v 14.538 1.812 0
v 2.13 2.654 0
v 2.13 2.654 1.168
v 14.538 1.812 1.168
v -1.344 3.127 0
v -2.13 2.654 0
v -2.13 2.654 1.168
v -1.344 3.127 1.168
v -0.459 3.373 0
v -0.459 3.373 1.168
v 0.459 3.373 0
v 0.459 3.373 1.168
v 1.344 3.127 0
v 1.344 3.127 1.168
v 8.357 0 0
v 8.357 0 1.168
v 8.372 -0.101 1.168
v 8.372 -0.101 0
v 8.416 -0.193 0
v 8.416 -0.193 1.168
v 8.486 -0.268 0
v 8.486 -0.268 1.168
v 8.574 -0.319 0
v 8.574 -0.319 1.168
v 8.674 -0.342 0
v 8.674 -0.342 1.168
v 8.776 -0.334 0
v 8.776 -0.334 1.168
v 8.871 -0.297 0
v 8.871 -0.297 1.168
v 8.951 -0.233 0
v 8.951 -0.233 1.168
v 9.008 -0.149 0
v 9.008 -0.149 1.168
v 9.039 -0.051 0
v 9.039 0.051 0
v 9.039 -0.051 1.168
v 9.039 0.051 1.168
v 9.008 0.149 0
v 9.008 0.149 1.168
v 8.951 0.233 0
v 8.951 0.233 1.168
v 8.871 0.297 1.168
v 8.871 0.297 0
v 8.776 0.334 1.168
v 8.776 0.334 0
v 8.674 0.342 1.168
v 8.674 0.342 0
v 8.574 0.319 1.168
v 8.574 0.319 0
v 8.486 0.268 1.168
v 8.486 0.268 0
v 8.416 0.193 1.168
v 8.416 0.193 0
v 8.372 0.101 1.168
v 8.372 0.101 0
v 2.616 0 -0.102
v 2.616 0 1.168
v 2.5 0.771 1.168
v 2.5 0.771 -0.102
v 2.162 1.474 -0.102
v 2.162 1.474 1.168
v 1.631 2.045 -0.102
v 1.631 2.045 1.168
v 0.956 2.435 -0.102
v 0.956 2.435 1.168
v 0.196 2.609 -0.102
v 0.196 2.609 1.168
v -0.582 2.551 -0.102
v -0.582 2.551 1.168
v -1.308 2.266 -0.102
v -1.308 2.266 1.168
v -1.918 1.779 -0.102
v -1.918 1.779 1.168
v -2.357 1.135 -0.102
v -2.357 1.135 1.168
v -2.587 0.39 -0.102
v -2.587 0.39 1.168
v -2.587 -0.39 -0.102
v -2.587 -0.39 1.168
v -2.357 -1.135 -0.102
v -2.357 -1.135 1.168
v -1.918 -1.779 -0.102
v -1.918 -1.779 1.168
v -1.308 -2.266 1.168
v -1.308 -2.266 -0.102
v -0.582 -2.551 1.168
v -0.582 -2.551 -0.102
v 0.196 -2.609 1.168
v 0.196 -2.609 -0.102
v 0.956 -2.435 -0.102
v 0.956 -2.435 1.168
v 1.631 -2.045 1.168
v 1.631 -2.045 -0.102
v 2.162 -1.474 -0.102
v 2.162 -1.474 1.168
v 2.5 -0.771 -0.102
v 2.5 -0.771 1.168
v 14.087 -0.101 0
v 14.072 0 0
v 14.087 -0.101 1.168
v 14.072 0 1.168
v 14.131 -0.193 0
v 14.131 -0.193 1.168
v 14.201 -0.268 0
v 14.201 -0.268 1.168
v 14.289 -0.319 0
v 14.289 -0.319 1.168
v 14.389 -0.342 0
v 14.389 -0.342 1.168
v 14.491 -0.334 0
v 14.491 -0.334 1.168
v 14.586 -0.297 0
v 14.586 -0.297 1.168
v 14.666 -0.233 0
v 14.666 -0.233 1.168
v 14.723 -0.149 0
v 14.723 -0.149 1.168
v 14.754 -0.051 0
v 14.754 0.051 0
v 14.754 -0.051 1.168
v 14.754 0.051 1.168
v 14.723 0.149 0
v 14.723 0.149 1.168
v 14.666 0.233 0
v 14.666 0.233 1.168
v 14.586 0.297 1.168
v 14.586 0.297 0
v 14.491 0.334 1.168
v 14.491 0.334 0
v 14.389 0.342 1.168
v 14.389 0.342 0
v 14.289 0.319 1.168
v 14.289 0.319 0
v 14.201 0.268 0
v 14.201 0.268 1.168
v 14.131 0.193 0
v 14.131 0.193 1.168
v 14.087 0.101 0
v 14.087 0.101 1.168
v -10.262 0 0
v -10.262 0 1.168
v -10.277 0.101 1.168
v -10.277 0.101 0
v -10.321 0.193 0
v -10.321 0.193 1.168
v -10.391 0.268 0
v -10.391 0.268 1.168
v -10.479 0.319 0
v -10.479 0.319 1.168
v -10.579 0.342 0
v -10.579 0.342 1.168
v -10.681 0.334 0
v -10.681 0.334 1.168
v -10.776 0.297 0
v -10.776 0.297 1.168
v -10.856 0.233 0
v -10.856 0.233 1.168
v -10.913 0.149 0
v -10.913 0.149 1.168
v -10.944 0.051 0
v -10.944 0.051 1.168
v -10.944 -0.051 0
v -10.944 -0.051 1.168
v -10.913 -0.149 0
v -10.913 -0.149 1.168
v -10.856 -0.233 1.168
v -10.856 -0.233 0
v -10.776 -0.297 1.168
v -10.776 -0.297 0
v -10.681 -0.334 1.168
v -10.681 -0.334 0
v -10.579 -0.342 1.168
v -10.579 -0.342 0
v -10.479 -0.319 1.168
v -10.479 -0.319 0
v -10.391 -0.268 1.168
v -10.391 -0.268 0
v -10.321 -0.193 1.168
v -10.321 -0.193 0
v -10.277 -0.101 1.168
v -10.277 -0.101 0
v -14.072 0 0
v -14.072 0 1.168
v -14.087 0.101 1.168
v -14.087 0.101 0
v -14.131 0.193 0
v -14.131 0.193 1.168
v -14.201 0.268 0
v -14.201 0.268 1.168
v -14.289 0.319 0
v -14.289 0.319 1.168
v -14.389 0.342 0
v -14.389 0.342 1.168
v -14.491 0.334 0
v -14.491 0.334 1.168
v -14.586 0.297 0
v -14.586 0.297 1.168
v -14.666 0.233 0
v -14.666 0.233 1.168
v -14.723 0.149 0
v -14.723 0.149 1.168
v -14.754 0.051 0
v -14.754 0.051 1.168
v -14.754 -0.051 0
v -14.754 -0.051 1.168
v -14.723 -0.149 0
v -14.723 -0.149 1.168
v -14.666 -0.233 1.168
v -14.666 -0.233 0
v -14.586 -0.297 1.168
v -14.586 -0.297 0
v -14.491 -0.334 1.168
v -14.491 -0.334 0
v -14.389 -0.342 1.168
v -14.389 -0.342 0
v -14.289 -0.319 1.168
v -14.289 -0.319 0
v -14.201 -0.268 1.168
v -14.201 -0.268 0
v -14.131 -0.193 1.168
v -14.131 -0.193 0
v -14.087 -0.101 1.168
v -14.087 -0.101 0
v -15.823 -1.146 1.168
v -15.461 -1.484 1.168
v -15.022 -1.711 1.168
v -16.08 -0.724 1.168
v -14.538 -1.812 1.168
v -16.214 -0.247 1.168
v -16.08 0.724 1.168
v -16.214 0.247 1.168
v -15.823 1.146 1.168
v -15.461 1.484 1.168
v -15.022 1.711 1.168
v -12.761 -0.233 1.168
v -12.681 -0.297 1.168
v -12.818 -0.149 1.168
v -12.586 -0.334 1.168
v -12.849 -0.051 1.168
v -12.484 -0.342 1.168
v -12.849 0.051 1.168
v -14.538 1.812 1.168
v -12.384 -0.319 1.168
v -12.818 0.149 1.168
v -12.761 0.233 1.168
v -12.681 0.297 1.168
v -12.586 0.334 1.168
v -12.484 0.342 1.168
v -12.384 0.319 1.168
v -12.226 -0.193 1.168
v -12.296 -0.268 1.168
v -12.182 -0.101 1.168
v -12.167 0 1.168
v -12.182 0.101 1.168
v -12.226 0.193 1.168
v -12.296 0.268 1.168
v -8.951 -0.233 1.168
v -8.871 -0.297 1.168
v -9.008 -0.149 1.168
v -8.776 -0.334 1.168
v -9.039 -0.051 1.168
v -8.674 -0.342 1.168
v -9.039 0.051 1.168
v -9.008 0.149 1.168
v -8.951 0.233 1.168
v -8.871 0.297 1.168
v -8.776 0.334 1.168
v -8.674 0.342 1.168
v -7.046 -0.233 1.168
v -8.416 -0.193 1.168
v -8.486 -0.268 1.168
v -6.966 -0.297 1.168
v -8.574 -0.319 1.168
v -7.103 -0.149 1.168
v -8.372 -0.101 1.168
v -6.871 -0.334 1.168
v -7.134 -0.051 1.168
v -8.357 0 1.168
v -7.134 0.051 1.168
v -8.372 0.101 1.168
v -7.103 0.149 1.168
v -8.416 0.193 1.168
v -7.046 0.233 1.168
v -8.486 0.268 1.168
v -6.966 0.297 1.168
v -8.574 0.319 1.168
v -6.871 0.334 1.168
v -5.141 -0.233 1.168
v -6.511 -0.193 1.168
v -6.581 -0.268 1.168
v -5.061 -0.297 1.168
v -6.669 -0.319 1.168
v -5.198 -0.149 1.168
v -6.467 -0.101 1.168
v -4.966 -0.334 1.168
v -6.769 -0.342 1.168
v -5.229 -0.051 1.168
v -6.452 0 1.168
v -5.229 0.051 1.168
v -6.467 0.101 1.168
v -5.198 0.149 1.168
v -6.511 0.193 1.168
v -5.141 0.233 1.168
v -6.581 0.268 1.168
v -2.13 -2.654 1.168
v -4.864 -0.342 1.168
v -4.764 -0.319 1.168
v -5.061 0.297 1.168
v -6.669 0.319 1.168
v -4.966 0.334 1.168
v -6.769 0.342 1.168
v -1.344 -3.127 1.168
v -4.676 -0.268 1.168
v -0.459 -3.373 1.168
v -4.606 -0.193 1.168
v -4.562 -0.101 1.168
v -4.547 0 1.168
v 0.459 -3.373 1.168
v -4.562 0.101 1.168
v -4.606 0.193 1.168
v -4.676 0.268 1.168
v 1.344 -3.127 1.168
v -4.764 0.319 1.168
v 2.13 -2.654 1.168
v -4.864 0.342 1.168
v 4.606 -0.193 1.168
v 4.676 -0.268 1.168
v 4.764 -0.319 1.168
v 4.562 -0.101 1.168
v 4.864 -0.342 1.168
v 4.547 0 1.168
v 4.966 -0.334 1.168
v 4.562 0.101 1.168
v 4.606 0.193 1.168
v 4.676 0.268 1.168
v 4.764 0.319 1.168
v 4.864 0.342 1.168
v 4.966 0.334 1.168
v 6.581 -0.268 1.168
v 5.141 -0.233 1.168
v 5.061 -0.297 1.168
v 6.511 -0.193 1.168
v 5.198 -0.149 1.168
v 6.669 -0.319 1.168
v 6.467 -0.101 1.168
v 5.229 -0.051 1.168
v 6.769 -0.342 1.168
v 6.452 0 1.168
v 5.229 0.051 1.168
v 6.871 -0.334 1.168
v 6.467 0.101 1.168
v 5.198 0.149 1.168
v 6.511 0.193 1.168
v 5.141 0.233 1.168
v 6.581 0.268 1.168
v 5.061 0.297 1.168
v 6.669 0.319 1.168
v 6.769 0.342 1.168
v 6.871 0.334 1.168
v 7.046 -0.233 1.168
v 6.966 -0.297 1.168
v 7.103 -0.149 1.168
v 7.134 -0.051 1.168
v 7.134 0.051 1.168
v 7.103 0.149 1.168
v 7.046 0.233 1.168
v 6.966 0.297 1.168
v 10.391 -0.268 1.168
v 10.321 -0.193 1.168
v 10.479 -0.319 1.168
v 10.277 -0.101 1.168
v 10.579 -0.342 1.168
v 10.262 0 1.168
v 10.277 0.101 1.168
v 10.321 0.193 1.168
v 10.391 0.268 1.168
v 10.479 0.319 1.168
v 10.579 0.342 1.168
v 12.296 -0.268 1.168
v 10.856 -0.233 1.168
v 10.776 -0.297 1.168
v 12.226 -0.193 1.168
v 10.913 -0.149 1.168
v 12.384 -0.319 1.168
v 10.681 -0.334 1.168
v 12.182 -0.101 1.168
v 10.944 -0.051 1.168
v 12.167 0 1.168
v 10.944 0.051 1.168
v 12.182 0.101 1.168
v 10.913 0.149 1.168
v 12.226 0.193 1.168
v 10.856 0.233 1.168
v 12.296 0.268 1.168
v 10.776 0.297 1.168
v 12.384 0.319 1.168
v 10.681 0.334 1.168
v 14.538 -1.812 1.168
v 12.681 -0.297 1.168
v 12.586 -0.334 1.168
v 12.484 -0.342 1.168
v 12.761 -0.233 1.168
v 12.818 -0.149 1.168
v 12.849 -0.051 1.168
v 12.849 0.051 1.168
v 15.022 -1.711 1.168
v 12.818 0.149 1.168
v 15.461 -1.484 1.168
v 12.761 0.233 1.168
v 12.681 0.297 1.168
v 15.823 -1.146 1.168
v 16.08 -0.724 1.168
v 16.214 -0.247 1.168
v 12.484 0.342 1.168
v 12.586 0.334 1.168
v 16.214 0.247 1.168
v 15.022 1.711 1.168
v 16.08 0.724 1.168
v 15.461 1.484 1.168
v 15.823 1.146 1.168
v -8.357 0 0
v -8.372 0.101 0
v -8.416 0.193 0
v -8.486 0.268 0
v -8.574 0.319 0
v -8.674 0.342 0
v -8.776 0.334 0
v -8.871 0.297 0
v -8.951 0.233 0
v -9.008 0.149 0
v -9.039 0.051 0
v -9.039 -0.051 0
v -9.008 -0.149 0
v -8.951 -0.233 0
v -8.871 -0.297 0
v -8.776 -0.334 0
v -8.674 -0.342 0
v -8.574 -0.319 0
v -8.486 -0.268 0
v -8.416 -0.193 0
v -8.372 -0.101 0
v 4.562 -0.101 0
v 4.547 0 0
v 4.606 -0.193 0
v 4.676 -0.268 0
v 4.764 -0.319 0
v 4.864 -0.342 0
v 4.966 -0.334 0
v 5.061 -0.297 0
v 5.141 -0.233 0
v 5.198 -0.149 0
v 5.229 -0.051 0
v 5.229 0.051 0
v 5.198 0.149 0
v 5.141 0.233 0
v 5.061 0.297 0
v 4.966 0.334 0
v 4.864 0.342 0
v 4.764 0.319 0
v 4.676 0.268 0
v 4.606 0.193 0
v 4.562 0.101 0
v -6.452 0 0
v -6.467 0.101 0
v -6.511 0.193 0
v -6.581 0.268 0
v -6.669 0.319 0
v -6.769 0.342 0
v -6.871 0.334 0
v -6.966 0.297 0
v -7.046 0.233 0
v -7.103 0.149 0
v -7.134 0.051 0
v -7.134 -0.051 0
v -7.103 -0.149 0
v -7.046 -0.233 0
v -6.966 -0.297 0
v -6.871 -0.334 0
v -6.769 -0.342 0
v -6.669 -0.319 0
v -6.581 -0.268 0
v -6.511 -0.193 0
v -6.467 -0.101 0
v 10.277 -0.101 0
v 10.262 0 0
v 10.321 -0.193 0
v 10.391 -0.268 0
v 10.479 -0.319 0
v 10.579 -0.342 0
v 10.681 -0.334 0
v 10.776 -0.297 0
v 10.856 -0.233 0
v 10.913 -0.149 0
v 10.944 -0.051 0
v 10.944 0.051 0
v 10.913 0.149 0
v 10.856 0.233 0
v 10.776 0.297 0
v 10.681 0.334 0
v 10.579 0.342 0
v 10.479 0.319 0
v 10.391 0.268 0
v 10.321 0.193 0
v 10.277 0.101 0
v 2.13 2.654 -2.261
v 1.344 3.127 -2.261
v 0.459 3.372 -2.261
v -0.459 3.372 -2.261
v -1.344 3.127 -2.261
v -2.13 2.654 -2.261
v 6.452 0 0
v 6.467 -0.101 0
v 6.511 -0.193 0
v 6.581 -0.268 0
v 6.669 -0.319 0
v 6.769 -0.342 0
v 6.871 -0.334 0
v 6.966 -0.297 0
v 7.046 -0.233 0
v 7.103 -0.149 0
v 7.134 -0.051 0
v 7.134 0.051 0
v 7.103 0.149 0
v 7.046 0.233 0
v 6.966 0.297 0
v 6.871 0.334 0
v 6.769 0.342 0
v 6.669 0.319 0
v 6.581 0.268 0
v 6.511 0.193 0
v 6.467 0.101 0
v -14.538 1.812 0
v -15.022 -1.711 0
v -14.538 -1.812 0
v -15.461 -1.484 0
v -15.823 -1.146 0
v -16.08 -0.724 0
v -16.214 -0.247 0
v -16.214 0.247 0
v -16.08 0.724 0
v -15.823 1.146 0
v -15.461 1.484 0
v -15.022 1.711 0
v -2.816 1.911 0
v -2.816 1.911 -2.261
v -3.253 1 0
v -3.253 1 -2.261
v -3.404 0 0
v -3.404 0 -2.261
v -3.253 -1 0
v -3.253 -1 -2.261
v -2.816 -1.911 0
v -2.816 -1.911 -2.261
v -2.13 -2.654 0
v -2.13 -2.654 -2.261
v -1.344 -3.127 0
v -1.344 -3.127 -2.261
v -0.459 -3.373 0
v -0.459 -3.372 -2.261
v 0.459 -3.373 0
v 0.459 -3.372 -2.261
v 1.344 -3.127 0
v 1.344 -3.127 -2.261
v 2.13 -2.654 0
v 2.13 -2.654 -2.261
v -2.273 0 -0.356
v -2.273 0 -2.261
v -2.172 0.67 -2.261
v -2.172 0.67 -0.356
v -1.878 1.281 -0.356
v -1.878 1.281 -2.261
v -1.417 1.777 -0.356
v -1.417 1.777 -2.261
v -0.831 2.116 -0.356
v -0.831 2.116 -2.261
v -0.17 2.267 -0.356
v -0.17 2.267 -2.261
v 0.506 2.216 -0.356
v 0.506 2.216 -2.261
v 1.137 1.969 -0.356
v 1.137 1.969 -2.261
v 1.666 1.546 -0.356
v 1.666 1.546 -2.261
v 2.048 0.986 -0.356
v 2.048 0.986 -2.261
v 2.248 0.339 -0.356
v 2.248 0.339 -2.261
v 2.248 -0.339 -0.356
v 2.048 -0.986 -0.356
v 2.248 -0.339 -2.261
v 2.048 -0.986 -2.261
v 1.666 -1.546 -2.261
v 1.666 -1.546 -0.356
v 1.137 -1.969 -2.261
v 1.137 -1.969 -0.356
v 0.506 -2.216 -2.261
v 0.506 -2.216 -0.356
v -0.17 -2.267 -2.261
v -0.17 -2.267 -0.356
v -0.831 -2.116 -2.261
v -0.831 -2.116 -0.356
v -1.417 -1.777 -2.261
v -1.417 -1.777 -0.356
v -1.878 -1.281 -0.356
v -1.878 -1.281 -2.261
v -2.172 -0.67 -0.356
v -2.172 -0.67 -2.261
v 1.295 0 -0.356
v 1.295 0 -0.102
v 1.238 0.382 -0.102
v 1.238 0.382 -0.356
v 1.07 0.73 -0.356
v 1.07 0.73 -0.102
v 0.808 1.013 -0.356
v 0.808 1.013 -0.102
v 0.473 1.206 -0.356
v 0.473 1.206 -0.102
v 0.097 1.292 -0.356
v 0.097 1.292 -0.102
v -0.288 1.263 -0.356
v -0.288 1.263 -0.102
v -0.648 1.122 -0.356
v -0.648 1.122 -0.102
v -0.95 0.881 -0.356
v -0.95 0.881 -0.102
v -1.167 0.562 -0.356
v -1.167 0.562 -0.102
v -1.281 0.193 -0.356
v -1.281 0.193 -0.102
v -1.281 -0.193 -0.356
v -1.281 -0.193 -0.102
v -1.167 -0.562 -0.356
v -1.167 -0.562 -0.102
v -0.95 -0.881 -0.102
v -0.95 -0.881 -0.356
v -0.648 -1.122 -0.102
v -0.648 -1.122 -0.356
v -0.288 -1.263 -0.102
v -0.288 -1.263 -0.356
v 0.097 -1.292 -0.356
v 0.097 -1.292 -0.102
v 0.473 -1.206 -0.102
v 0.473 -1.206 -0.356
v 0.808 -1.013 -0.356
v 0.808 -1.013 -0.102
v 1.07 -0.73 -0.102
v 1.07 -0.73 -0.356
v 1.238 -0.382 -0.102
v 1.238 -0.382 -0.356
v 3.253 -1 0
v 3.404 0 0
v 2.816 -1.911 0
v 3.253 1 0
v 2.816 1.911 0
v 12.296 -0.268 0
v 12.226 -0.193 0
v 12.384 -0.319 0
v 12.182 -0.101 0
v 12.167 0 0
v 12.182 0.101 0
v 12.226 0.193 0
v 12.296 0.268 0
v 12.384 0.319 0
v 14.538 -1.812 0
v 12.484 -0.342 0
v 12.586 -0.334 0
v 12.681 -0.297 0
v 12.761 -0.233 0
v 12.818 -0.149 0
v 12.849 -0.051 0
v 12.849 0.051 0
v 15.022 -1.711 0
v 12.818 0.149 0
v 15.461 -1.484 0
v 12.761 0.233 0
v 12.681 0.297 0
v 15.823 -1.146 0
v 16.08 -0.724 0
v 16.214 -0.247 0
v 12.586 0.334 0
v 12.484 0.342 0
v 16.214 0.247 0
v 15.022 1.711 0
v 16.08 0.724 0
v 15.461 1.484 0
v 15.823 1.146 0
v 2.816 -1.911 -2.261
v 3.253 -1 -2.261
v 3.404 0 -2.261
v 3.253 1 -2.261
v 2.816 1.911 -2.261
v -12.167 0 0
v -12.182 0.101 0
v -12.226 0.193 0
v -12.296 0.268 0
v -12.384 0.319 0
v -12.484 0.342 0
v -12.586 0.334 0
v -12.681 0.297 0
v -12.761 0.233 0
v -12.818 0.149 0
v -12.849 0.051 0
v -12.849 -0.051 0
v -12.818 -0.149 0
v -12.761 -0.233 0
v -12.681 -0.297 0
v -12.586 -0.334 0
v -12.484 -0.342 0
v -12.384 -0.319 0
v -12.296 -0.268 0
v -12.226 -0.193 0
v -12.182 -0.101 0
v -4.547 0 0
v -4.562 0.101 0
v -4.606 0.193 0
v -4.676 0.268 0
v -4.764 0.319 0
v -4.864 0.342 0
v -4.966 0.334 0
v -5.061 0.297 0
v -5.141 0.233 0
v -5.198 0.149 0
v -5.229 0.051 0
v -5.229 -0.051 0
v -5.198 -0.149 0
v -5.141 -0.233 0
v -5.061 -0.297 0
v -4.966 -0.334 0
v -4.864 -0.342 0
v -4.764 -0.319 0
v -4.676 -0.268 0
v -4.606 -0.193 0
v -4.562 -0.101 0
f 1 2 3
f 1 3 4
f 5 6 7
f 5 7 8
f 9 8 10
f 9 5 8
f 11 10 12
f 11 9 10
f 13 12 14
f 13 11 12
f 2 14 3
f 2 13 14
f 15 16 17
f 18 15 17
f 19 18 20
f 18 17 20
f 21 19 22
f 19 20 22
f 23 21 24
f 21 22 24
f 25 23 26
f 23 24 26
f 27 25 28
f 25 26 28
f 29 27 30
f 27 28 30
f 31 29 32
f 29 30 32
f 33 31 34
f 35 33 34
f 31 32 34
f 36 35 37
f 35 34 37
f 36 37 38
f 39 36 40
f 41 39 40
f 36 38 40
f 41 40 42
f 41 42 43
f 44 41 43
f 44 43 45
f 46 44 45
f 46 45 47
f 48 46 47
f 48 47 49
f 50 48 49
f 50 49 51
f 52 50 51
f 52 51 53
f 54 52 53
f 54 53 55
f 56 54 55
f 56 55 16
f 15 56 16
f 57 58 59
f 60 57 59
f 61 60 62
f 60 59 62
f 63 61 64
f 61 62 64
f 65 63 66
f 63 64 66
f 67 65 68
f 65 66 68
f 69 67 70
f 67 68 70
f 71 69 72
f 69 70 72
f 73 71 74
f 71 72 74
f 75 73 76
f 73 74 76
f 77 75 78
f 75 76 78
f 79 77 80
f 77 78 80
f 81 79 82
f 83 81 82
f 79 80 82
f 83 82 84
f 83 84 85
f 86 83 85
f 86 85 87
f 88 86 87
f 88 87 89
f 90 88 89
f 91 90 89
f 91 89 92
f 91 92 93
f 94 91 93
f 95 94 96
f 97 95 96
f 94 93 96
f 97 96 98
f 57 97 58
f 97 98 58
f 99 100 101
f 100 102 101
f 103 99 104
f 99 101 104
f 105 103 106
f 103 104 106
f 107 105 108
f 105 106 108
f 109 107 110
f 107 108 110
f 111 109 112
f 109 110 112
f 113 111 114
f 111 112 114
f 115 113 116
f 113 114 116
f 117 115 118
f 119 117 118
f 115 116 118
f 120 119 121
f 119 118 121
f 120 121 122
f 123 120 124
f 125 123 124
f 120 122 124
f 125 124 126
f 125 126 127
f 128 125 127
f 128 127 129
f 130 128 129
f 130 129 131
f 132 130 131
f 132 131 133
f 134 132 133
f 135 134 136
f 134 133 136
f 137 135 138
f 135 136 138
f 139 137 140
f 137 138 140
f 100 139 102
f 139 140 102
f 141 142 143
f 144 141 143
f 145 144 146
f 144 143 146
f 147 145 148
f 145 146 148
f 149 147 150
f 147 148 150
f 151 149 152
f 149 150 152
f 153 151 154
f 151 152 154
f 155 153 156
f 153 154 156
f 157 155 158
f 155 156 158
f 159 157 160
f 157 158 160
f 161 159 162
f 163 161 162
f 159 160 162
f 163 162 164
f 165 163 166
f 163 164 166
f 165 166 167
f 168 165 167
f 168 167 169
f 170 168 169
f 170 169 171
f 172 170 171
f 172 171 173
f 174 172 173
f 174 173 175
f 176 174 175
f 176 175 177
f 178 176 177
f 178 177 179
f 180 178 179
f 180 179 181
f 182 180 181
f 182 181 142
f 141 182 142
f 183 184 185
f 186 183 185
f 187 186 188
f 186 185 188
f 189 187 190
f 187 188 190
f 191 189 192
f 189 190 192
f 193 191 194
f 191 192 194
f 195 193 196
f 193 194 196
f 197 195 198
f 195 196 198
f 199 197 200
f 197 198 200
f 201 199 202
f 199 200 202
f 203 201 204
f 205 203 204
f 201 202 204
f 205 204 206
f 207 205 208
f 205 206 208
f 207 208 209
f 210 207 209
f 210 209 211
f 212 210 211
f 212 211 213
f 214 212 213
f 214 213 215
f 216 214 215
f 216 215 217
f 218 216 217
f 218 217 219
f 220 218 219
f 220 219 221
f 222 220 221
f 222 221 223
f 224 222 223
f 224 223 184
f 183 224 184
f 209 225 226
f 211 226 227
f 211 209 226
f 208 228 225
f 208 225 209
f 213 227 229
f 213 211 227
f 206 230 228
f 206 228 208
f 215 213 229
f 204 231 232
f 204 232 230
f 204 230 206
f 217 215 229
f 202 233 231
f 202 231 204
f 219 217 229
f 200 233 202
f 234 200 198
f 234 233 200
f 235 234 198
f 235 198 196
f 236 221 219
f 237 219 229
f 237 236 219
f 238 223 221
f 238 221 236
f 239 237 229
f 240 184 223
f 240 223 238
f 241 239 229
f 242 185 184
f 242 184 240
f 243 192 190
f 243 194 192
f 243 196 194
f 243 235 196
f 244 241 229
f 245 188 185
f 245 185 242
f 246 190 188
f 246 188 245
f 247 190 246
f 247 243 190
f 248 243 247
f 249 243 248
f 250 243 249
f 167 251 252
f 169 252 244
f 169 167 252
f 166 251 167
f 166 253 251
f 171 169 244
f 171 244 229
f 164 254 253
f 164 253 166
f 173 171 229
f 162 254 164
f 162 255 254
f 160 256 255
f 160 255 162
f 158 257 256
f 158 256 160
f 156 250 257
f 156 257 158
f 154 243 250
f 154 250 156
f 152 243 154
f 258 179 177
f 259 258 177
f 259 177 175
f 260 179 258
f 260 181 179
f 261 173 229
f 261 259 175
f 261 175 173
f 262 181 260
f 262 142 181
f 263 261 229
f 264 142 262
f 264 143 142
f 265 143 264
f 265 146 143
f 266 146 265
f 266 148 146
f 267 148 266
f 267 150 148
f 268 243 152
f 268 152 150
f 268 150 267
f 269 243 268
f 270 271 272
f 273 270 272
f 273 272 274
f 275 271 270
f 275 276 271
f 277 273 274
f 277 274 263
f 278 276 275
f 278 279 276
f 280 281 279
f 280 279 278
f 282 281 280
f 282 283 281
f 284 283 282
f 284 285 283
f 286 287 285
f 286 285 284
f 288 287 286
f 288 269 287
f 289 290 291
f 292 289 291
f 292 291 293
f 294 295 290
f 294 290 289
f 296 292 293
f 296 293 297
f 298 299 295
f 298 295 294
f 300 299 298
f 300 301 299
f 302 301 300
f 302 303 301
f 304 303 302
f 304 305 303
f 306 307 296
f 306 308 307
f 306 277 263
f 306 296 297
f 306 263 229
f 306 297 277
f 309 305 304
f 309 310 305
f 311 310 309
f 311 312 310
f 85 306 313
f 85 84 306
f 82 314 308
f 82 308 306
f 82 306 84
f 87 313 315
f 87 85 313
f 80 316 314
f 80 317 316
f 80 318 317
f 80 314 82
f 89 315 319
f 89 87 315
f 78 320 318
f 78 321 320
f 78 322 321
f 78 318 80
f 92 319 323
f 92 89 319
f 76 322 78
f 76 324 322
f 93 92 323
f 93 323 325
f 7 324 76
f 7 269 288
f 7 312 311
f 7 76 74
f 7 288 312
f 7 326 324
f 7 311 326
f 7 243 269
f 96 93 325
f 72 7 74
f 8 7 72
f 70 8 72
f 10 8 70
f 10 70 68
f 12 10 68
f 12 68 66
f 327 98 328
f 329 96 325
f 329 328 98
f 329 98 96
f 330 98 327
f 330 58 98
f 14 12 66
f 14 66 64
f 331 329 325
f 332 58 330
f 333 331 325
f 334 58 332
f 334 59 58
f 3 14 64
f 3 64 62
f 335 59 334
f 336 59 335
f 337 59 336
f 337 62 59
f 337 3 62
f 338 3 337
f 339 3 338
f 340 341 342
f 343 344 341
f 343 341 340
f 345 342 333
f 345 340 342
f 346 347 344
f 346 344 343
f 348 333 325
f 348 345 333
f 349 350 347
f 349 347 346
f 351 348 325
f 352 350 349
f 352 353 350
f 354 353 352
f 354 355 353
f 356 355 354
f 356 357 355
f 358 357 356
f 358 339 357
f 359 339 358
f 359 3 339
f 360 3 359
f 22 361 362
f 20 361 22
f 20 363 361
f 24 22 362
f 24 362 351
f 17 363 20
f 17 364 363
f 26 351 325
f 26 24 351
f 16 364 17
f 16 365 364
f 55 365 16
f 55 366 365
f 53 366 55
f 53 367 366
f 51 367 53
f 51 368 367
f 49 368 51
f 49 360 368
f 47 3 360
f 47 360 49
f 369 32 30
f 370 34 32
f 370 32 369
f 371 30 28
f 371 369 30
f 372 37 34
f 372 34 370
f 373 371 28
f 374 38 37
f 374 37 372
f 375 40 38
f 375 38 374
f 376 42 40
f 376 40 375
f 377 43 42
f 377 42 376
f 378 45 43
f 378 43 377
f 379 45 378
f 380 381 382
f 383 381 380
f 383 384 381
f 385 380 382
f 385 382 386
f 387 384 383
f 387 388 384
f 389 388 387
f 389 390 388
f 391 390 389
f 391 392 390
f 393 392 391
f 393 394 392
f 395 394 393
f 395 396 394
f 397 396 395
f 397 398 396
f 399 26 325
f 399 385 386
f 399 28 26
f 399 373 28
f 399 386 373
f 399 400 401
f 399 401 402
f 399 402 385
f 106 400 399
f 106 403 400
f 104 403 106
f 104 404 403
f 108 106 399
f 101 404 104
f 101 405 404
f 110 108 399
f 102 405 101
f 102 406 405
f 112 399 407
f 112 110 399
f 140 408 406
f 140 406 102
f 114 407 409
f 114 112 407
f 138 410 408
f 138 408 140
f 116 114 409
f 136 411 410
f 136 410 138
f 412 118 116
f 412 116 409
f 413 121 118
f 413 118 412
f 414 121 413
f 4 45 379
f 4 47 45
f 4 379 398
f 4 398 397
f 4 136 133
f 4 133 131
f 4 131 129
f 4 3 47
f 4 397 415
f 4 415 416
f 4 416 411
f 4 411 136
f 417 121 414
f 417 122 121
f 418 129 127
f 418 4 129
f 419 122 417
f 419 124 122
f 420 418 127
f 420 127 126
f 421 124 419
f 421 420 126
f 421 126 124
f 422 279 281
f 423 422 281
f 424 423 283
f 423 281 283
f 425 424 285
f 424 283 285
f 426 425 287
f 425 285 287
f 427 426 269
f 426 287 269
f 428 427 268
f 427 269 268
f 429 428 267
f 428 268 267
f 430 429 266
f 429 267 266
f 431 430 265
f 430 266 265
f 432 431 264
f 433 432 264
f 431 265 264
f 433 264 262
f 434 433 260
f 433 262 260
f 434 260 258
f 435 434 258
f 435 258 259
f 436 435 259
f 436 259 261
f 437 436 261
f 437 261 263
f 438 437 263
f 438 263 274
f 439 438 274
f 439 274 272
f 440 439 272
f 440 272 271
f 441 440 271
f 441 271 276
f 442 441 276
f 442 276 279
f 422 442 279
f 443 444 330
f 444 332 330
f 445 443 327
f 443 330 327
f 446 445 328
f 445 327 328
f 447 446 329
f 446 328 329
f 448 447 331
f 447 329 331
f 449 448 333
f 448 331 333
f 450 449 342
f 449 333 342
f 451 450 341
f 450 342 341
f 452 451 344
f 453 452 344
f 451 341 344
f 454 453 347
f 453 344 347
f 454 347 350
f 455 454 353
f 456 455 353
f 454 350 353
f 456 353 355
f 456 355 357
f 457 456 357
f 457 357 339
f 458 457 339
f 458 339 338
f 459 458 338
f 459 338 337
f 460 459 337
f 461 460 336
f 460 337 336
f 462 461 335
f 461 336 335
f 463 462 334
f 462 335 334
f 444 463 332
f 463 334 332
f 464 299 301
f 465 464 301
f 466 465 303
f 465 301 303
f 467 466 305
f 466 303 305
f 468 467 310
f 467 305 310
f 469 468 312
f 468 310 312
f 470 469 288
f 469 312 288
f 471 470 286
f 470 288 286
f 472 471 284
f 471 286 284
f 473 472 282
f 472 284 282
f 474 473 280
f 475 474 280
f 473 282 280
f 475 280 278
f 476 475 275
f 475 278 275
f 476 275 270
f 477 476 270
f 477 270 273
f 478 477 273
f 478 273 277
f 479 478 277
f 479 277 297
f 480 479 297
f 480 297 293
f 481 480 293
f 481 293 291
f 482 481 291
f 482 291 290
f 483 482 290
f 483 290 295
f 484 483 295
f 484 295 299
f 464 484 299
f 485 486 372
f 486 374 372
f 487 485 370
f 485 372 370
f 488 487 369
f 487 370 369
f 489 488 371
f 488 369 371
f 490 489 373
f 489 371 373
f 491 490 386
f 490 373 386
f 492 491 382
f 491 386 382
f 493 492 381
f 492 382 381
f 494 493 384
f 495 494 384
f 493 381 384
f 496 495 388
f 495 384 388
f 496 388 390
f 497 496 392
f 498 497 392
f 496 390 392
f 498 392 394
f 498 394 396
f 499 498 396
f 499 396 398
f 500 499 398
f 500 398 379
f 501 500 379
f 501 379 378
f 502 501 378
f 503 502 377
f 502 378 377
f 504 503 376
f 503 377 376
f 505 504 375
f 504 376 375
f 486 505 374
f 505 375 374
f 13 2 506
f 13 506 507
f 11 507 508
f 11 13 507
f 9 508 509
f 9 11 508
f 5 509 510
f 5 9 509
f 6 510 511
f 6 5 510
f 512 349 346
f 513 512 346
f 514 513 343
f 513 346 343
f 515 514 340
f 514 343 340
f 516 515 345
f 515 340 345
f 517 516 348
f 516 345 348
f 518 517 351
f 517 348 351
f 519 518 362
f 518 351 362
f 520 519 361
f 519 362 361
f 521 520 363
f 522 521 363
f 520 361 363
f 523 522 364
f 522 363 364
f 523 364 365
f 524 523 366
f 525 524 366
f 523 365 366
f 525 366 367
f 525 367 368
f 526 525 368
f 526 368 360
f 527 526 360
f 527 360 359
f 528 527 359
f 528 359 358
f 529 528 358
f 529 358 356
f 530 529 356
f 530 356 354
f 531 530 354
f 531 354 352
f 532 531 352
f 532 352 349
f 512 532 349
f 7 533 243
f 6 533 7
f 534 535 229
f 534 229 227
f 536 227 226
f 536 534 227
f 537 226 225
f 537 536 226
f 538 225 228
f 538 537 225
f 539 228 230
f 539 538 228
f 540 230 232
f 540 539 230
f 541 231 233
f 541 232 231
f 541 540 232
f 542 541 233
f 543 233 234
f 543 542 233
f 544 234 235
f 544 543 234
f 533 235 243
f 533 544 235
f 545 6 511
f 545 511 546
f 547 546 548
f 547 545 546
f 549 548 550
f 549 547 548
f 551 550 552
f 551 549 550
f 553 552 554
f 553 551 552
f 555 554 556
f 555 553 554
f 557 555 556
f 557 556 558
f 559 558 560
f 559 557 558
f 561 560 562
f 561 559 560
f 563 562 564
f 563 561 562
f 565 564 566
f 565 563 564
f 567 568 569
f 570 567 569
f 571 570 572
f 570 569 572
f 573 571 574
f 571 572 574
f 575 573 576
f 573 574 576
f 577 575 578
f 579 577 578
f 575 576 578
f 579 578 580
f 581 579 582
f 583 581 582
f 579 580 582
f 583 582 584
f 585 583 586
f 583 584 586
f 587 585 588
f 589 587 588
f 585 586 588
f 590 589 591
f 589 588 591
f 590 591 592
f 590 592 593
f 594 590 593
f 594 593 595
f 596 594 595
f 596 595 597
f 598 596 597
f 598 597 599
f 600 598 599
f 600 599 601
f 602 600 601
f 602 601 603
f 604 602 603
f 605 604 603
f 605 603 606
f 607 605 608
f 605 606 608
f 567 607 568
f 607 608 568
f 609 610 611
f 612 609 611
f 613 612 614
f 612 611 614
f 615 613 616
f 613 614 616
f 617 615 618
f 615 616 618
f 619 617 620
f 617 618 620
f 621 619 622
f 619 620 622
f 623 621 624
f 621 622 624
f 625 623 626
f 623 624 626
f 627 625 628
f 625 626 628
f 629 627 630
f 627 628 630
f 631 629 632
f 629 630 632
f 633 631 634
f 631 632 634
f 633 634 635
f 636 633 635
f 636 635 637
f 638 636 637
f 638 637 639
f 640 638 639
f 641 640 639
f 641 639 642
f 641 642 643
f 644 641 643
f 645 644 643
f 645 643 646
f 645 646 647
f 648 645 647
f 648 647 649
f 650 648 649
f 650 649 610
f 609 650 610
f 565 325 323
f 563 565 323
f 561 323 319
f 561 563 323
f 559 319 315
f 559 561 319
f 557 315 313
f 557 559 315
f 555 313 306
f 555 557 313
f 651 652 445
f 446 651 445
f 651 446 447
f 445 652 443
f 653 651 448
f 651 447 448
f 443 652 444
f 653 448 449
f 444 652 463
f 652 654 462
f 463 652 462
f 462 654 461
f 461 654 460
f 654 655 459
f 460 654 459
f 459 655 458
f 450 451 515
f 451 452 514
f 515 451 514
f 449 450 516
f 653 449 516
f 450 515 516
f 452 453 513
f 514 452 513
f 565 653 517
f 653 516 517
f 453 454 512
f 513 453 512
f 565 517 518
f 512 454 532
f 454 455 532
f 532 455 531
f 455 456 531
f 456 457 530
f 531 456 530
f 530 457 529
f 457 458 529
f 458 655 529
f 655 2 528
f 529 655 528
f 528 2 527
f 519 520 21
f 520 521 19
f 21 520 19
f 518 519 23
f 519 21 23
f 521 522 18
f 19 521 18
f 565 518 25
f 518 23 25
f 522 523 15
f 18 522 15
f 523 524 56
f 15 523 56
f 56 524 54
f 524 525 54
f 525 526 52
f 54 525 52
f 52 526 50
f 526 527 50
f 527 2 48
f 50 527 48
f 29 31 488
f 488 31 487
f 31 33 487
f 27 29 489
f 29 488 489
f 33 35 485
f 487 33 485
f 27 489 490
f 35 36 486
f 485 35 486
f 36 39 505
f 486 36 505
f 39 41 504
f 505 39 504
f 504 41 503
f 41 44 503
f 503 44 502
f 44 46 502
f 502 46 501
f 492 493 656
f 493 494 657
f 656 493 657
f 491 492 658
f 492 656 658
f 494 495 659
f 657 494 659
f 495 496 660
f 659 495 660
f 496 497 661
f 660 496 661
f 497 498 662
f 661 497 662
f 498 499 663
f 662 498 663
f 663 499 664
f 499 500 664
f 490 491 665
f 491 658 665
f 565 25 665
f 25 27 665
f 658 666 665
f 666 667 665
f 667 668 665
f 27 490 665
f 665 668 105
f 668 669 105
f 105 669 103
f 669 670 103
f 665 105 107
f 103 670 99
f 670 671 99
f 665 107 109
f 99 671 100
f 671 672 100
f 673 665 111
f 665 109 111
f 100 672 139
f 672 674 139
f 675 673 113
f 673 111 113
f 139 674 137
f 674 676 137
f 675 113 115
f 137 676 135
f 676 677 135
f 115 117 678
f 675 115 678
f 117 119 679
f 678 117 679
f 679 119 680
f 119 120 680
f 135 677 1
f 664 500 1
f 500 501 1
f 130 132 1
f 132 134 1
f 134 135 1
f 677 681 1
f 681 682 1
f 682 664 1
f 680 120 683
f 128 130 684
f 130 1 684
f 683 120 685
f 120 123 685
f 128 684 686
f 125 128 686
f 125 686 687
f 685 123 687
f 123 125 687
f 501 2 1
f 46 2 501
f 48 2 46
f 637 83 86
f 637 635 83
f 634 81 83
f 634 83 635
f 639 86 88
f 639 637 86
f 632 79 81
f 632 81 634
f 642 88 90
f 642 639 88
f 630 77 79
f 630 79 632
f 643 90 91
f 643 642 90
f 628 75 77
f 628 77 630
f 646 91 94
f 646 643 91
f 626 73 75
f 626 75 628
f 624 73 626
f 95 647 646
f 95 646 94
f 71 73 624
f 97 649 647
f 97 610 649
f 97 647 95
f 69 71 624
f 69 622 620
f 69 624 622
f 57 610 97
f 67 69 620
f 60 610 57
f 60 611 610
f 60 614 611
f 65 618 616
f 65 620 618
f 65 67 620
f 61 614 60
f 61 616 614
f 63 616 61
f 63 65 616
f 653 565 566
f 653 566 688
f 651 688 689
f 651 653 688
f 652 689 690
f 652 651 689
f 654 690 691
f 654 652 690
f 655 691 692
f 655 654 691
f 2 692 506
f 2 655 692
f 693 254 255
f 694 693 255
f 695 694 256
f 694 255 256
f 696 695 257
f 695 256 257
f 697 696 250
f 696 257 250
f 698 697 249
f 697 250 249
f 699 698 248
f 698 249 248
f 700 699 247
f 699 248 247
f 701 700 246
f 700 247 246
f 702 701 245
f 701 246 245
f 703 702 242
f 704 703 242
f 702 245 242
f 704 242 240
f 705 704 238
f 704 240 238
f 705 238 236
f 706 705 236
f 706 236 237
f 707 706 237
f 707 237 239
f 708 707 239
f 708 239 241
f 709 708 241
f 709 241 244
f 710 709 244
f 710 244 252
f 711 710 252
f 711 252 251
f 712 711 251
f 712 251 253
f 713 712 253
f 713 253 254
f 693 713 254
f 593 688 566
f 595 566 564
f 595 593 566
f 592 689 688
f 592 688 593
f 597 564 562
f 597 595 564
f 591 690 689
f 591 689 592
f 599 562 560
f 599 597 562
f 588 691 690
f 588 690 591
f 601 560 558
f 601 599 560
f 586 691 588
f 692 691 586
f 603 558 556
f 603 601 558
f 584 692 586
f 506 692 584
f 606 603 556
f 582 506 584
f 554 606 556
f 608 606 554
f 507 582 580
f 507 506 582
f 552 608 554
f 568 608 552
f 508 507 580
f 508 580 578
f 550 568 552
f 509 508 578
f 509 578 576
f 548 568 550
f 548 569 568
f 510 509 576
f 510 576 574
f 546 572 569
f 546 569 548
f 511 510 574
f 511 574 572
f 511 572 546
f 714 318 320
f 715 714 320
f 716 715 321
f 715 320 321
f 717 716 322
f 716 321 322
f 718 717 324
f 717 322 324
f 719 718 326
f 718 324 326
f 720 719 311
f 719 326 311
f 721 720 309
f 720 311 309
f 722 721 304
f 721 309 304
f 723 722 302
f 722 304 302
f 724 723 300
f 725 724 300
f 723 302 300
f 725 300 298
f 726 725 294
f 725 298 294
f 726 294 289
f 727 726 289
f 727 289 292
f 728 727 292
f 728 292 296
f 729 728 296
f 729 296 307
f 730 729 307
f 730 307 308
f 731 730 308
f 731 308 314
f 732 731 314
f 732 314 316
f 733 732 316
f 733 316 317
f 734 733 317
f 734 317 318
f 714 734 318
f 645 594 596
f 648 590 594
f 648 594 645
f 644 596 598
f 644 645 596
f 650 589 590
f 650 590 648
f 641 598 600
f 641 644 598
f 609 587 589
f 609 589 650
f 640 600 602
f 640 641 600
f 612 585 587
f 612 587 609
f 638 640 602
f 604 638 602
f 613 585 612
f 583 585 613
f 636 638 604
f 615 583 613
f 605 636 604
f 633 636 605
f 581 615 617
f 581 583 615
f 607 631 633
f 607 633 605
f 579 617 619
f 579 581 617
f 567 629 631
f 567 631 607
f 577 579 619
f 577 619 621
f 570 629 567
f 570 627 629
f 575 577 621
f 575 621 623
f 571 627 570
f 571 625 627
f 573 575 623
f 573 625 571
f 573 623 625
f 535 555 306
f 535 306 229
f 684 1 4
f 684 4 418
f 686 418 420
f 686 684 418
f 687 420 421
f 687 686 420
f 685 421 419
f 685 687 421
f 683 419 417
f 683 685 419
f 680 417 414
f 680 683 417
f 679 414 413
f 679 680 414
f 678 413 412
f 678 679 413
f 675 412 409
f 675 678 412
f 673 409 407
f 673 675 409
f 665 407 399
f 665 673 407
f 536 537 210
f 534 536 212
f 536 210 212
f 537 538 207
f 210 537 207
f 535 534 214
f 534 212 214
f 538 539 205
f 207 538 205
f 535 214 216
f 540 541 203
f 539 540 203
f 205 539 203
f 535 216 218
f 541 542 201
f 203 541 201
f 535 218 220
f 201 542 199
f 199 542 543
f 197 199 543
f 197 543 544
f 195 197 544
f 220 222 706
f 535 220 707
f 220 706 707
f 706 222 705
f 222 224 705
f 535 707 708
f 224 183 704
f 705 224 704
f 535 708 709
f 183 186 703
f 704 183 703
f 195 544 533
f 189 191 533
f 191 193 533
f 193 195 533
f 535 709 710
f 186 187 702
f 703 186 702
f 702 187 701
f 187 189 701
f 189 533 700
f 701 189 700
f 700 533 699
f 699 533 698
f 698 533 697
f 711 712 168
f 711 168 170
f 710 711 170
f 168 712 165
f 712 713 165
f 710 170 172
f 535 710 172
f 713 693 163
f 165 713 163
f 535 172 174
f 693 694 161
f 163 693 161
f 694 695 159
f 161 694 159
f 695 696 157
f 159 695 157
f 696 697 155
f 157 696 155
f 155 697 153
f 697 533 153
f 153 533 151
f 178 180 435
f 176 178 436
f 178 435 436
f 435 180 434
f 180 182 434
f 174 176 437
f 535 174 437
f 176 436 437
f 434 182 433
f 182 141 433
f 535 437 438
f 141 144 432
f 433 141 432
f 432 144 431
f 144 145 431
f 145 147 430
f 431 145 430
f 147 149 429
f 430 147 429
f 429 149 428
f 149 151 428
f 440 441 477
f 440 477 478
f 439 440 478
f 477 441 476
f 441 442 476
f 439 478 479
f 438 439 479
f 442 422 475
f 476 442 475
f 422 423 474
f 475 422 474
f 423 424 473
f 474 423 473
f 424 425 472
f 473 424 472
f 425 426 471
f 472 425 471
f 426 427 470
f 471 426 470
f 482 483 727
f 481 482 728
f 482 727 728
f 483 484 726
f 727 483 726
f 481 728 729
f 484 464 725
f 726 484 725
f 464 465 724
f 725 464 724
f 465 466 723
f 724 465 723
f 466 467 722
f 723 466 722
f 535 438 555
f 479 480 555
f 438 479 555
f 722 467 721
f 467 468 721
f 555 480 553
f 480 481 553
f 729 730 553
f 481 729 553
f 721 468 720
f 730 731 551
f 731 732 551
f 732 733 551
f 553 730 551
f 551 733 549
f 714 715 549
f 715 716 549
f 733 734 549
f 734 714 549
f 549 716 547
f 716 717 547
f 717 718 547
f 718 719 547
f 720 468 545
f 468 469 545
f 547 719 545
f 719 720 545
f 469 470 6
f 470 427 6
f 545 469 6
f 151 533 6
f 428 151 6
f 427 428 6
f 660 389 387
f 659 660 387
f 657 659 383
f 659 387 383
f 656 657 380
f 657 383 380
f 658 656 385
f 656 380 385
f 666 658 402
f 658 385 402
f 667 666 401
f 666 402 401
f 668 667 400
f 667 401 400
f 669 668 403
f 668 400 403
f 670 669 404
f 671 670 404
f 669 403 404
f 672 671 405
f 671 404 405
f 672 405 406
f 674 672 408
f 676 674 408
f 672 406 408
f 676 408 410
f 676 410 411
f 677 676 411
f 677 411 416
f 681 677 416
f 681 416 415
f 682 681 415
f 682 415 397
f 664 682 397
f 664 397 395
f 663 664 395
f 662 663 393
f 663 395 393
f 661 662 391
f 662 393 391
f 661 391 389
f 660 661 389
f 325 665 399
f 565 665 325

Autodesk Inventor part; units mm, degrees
ref_plane "YZ Plane" through (0, 0, 0) normal (1, 0, 0) x (0, 1, 0)
ref_plane "XZ Plane" through (0, 0, 0) normal (0, 1, 0) x (-1, 0, 0)
ref_plane "XY Plane" through (0, 0, 0) normal (0, 0, 1) x (1, 0, 0)
sketch "Sketch1" plane through (0, 0, 0) normal (0, 0, 1) x (1, 0, 0)
  circle A0 centre (0, 0) radius 3.4036
  circle A1 centre (-14.4145, 0) radius 1.8161
  circle A2 centre (14.4145, 0) radius 1.8161
  line L0 (0, 0) -> (0, 12.9246) construction
  line L1 (-14.5375, 1.8119) -> (-2.1305, 2.6543)
  line L2 (2.1305, 2.6543) -> (14.5375, 1.8119)
  line L3 (14.5375, -1.8119) -> (2.1305, -2.6543)
  line L4 (-2.1305, -2.6543) -> (-14.5375, -1.8119)
  dimension "d0" = 6.8072
  dimension "d1" = 3.6322
  dimension "d2" = 32.4612
  dimension "d3" = 5.3086
extrude "Extrusion1" add sketch "Sketch1" along normal blind 1.1684
sketch "Sketch2" plane through (0, 0, 0) normal (0, 0, -1) x (-1, 0, 0)
  arc A0 (14.5375, -1.8119) -> (14.5375, 1.8119) centre (14.4145, 0) ccw projected
  line L0 (2.1305, 2.6543) -> (14.5375, 1.8119) projected
  arc A1 (2.1305, 2.6543) -> (-2.1305, 2.6543) centre (0, 0) ccw projected
  line L1 (-14.5375, 1.8119) -> (-2.1305, 2.6543) projected
  arc A2 (-14.5375, 1.8119) -> (-14.5375, -1.8119) centre (-14.4145, 0) ccw projected
  line L2 (-2.1305, -2.6543) -> (-14.5375, -1.8119) projected
  arc A3 (-2.1305, -2.6543) -> (2.1305, -2.6543) centre (0, 0) ccw projected
  line L3 (14.5375, -1.8119) -> (2.1305, -2.6543) projected
  circle A4 centre (0, 0) radius 3.4036
extrude "Extrusion2" add sketch "Sketch2" along normal blind 2.2606 contours A3 A4 A1
sketch "Sketch3" plane through (0, 0, -2.2606) normal (0, 0, -1) x (-1, 0, 0)
  circle A0 centre (0, 0) radius 2.2733
  dimension "d8" = 4.5466
extrude "Extrusion3" cut sketch "Sketch3" against normal blind 1.905
sketch "Sketch4" plane through (0, 0, 1.1684) normal (0, 0, 1) x (1, 0, 0)
  circle A0 centre (0, 0) radius 2.6162
  dimension "d11" = 5.2324
extrude "Extrusion4" cut sketch "Sketch4" against normal blind 1.27
sketch "Sketch5" plane through (0, 0, -0.1016) normal (0, 0, 1) x (1, 0, 0)
  circle A0 centre (0, 0) radius 1.2954
  dimension "d14" = 2.5908
extrude "Extrusion5" cut sketch "Sketch5" against normal blind 1.27
sketch "Sketch6" plane through (0, 0, 1.1684) normal (0, 0, 1) x (1, 0, 0)
  arc A0 (-14.5375, 1.8119) -> (-14.5375, -1.8119) centre (-14.4145, 0) ccw projected
  circle A1 centre (-14.4145, 0) radius 0.3429
  point P0 (0, 0)
  dimension "d17" = 0.6858
extrude "Extrusion6" cut sketch "Sketch6" against normal through all
pattern_linear "Rectangular Pattern1" count 6 spacing 1.905 along (1, 0, 0) of "Extrusion6"
mirror "Mirror1" about plane through (0, 0, 0) normal (1, 0, 0) of "Extrusion6", "Rectangular Pattern1"
properties part number "2 Way MicroServo Attachment"
